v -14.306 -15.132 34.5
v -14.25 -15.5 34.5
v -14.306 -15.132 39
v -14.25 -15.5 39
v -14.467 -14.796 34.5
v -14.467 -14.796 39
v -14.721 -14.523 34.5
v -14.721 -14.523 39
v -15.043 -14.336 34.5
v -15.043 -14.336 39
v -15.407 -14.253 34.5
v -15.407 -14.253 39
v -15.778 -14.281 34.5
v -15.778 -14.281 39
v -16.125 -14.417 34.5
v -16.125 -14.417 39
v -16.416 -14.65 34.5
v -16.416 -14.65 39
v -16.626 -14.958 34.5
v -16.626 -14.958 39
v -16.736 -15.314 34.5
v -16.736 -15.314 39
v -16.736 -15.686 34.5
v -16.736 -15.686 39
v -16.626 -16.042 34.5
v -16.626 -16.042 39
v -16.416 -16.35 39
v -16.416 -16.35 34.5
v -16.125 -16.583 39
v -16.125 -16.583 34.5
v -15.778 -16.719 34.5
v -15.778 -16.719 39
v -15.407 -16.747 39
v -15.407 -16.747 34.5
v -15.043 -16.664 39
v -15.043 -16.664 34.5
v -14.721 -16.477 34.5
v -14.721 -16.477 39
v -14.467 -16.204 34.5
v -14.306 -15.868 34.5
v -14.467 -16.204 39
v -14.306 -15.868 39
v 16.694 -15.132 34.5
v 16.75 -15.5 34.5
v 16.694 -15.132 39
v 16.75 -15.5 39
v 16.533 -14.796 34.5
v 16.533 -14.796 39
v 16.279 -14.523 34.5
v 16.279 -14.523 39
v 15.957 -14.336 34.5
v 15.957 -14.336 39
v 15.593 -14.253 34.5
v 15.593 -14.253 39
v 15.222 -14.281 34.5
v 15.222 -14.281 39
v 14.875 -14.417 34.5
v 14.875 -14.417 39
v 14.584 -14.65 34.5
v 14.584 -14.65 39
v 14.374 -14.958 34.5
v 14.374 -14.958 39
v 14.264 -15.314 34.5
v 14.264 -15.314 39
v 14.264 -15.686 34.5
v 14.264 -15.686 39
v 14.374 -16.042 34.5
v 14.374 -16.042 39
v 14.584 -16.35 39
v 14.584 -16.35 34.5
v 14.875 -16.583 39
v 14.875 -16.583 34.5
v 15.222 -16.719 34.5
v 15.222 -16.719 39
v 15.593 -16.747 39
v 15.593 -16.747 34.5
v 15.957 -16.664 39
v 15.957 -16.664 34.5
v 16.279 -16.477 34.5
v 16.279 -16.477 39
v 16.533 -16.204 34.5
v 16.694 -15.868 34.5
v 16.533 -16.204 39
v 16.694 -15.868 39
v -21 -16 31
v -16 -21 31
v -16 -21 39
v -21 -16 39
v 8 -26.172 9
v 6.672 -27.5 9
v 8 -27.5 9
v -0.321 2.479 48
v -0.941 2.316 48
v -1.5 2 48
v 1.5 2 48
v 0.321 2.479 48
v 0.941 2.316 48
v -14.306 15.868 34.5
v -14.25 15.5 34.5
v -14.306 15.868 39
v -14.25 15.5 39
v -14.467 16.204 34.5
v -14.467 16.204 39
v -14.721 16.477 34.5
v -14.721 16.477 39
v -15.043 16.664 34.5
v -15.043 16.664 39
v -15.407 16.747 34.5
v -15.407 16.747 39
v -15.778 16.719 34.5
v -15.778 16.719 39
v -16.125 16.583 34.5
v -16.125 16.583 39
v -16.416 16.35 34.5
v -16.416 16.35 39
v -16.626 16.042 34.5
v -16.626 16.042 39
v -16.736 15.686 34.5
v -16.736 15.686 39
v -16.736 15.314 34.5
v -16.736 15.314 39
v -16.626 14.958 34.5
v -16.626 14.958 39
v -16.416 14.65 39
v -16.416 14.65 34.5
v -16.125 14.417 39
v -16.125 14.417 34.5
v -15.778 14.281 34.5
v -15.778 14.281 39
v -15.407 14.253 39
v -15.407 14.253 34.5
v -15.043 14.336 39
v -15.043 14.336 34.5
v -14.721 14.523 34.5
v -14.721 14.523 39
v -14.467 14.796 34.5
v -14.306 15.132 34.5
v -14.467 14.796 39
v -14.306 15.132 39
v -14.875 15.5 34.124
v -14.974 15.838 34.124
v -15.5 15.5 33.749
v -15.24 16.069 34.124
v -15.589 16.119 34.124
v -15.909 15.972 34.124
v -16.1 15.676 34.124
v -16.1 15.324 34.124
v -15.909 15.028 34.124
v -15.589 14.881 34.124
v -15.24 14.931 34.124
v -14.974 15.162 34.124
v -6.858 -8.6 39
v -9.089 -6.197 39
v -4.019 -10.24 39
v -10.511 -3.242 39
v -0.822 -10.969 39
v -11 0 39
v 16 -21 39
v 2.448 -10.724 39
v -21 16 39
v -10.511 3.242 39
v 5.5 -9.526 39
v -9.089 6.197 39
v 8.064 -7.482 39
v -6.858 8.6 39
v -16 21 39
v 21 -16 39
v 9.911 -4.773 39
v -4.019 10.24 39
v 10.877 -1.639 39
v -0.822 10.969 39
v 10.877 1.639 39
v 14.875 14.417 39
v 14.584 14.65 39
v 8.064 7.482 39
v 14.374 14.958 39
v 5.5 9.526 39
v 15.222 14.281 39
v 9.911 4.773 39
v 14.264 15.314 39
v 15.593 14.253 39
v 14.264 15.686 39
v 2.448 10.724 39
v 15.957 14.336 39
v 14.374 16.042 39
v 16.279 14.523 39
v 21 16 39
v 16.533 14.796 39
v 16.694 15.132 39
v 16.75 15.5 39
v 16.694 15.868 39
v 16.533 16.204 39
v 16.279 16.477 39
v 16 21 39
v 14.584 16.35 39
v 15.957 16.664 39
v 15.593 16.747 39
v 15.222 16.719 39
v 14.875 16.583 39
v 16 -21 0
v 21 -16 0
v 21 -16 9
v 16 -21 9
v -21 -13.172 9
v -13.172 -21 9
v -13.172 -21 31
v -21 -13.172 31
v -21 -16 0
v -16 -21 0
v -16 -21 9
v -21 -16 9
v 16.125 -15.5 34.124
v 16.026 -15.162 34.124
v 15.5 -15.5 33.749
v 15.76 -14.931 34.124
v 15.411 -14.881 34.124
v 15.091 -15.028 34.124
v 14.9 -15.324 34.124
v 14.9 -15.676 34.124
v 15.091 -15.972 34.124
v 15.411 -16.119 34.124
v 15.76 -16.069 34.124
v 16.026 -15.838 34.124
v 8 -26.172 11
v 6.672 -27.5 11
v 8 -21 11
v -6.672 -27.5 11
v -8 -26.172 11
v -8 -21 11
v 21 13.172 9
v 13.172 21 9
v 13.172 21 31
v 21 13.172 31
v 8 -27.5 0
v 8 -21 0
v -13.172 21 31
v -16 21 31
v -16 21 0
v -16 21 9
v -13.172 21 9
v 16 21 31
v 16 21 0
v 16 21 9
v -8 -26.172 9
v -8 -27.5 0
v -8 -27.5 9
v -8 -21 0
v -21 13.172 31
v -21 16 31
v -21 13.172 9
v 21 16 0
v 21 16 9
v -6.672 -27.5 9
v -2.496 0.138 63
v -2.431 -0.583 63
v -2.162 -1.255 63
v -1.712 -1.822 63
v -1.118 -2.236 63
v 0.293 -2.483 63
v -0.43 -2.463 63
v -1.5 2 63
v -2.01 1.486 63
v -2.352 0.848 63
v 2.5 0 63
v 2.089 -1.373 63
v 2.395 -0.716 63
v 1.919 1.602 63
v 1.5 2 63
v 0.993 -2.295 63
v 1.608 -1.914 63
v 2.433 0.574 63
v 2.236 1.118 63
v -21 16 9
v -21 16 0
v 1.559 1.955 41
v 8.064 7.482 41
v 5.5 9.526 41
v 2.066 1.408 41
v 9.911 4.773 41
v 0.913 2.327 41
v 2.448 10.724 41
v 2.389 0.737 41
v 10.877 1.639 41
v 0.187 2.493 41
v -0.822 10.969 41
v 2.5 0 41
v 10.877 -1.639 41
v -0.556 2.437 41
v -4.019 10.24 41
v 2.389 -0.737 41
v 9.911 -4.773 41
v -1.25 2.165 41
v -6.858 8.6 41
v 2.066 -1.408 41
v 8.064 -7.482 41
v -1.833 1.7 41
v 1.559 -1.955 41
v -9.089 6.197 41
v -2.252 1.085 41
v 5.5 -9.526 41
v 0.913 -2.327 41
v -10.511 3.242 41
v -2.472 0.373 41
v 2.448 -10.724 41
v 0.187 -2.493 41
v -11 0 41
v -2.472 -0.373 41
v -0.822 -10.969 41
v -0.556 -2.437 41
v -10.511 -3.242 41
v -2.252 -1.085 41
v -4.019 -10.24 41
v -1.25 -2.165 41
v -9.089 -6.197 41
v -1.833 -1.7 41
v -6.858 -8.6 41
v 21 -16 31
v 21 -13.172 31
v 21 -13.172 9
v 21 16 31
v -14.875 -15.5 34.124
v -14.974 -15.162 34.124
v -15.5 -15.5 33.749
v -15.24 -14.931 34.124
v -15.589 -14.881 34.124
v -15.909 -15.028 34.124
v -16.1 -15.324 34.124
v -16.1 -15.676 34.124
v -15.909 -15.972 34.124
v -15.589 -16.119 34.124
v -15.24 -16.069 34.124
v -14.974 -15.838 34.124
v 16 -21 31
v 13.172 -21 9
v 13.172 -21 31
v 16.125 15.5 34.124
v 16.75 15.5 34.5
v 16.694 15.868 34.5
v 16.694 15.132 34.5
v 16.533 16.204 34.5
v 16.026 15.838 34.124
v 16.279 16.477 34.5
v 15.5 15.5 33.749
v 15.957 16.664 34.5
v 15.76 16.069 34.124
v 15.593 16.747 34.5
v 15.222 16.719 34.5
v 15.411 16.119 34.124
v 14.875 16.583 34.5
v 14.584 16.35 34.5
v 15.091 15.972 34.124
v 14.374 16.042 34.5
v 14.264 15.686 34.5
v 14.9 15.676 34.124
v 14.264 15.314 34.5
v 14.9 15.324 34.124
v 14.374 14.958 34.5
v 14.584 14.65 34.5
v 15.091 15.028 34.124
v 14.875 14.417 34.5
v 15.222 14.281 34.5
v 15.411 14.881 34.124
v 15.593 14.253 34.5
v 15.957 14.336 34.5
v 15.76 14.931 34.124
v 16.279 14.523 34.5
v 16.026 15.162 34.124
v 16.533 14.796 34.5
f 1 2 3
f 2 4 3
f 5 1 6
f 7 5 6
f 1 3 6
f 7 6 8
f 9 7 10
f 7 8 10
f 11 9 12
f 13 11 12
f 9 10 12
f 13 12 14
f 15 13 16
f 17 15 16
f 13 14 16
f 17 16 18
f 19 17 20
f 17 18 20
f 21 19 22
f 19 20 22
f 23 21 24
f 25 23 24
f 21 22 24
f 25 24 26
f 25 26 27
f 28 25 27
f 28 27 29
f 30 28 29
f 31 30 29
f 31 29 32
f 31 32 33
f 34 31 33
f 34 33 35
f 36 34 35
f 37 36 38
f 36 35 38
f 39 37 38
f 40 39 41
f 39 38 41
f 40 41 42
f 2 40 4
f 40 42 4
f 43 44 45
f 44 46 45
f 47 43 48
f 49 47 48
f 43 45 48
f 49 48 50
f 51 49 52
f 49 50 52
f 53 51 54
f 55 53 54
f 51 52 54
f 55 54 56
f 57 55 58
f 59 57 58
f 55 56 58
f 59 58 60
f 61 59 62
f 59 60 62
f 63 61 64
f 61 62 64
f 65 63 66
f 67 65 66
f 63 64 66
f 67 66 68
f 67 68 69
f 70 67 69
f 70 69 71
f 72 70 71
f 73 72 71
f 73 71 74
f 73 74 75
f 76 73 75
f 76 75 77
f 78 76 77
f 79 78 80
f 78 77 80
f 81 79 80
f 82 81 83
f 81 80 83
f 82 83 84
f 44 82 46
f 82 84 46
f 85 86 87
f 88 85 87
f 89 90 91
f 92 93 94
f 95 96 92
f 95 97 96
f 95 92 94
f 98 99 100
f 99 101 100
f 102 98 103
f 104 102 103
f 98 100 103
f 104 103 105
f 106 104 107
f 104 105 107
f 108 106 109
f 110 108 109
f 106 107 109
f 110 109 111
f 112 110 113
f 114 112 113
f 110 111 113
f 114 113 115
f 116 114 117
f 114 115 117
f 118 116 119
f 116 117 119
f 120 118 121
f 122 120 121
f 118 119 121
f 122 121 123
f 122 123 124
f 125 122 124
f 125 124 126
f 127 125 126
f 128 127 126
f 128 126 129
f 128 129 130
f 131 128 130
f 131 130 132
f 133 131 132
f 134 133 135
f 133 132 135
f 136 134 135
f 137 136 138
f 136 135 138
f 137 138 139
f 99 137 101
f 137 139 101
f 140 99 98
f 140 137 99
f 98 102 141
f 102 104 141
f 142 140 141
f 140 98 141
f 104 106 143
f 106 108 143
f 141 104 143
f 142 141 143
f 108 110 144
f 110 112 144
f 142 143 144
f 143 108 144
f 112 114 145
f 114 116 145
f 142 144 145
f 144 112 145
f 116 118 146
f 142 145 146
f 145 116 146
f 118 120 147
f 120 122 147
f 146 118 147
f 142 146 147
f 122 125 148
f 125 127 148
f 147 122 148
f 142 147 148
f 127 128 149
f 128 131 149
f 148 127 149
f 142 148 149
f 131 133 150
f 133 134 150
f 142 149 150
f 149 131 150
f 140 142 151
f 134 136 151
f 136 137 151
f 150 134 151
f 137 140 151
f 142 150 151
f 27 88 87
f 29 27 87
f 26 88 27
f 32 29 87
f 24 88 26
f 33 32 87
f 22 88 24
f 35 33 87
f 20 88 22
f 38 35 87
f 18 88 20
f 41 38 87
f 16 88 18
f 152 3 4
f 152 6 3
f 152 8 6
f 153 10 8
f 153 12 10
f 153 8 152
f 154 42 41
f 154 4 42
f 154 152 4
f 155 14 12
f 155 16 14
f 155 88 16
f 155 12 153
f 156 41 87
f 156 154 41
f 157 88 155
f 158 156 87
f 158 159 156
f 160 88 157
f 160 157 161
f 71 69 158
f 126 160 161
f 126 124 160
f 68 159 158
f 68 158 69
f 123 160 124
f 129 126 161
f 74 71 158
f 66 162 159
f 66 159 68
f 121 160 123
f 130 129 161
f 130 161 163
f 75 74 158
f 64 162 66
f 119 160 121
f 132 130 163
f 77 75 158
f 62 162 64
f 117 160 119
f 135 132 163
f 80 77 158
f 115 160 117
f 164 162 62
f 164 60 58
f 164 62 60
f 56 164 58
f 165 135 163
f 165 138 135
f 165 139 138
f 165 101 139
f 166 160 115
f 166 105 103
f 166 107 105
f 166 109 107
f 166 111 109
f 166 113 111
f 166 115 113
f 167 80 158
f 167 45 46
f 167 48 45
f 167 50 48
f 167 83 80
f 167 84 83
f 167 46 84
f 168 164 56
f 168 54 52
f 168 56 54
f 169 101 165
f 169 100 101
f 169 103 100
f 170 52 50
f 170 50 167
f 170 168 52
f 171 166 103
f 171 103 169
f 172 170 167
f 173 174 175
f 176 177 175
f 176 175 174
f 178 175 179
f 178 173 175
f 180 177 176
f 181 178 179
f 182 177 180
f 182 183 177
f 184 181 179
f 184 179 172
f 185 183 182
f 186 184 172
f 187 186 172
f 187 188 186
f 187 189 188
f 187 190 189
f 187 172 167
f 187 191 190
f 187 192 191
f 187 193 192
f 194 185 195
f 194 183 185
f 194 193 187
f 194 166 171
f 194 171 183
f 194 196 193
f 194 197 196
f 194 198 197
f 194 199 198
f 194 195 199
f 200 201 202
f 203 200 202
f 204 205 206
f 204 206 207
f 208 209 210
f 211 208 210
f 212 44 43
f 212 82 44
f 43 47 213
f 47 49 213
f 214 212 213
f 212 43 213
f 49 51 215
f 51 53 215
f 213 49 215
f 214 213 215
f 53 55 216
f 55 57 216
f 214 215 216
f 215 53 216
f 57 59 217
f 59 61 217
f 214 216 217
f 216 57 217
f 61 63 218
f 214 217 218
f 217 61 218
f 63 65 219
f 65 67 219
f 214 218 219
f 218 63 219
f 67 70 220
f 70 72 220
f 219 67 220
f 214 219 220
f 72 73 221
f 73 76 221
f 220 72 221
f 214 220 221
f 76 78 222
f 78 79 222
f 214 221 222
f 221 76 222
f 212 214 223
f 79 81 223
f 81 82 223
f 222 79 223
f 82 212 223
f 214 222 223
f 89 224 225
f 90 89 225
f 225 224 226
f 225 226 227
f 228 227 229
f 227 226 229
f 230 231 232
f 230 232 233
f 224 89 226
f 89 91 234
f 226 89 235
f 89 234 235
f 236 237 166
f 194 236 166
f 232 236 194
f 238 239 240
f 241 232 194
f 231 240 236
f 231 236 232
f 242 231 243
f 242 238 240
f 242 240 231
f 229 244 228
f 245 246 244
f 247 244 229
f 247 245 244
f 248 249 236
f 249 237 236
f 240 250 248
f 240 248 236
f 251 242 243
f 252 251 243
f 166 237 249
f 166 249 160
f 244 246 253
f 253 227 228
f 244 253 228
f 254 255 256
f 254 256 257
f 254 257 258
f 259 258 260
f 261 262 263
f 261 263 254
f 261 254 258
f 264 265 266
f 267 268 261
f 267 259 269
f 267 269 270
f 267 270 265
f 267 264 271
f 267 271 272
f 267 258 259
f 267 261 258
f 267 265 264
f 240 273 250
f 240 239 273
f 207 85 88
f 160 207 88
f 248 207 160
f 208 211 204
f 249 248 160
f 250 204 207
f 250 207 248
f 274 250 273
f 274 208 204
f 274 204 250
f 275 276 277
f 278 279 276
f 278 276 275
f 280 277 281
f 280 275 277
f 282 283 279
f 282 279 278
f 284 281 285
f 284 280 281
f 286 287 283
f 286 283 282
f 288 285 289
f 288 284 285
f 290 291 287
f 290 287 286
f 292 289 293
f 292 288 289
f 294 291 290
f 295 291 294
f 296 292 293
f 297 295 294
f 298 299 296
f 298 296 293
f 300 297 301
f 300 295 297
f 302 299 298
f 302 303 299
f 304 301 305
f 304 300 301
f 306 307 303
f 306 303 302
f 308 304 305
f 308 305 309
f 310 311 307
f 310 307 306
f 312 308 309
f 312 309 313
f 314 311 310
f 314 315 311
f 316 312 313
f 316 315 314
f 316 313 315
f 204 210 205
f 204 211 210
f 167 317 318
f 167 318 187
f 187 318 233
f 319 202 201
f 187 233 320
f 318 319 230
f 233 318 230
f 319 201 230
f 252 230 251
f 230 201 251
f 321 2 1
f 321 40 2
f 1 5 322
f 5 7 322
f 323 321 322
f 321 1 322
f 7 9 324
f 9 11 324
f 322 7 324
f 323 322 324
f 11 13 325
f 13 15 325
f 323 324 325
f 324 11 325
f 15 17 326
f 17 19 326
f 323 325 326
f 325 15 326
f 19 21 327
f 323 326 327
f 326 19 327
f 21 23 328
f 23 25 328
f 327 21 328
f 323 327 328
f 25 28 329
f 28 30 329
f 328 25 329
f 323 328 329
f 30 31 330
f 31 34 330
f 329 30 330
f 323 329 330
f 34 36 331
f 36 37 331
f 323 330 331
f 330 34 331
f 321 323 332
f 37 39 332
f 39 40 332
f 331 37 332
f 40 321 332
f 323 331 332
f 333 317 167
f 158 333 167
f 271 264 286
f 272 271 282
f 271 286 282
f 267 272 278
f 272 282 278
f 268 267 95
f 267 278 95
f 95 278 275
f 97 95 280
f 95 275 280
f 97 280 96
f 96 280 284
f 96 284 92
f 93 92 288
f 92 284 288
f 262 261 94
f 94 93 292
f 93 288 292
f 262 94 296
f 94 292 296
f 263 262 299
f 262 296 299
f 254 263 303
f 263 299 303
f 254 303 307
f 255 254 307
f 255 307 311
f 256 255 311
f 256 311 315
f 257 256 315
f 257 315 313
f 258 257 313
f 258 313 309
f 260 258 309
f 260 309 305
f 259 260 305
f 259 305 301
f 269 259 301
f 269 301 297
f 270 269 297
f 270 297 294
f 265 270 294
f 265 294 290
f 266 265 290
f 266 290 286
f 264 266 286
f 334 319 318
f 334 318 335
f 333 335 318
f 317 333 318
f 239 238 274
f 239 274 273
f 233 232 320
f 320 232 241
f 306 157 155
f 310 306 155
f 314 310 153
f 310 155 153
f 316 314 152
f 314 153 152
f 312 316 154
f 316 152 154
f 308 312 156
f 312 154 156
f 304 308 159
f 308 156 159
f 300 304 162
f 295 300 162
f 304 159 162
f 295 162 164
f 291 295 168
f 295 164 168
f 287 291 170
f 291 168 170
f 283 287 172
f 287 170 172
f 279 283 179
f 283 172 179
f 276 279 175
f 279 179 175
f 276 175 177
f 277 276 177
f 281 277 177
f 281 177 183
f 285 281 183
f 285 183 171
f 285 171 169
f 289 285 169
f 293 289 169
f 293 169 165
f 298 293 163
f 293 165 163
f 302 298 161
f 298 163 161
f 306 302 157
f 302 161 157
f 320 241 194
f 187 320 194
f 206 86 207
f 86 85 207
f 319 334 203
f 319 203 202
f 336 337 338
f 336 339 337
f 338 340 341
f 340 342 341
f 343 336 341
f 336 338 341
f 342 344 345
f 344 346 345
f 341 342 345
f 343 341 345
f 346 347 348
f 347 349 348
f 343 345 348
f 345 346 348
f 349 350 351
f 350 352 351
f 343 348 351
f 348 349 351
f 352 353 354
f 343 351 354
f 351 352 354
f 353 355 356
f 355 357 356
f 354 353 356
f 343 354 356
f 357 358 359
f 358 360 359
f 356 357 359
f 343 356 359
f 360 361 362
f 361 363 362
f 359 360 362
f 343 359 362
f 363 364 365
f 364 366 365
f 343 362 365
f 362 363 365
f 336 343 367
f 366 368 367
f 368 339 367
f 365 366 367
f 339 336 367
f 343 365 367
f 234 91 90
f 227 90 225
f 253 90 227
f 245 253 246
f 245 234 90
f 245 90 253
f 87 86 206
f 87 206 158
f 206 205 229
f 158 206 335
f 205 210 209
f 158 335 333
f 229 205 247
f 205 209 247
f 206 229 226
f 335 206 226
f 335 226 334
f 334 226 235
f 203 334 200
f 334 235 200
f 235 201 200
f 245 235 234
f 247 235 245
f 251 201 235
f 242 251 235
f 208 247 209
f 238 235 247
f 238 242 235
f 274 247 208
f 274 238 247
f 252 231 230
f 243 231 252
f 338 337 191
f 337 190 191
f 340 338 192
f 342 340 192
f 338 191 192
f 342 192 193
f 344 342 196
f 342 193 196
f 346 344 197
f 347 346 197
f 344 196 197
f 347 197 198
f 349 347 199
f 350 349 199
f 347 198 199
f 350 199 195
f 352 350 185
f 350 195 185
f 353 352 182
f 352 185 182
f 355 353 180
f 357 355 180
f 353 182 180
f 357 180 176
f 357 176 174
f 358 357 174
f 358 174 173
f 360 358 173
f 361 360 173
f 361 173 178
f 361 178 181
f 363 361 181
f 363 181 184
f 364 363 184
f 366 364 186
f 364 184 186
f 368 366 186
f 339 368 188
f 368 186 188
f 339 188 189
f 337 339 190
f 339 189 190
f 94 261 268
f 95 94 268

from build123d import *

# Parameters (mm, degrees)
SKETCH1_W           = 42
SKETCH1_H           = 42
BOSS_EXTRUDE1_DEPTH = 39
CHAMFER1_SIZE       = 5
SKETCH5_R           = 11
SKETCH5_R_2         = 2.5
BOSS_EXTRUDE2_DEPTH = 2
SKETCH6_R           = 2.5
BOSS_EXTRUDE3_DEPTH = 24
SKETCH7_W           = 5.502287021
SKETCH7_H           = 7.880652758
CUT_EXTRUDE1_DEPTH  = 15
SKETCH8_W           = 16
SKETCH8_H           = 13
BOSS_EXTRUDE4_DEPTH = 11
CUT_EXTRUDE2_START  = -8
SKETCH9_W           = 84.832687132
SKETCH9_H           = 82.051636753
CUT_EXTRUDE2_DEPTH  = 22


# Read off the part's stored shape, not the designer's step: M3x0.5 Tapped Hole1
with BuildPart() as part:
    # Sketch1 → Boss-Extrude1 (new body)
    with BuildSketch(Plane.XY):
        Rectangle(SKETCH1_W, SKETCH1_H)
    extrude(amount=BOSS_EXTRUDE1_DEPTH)

    # Chamfer1
    chamfer1_edges = [part.edges().sort_by_distance(p)[0] for p in [
        (21, -21, 19.5),
        (-21, -21, 19.5),
        (-21, 21, 19.5),
        (21, 21, 19.5),
    ]]
    chamfer(chamfer1_edges, length=CHAMFER1_SIZE)

    # M3x0.5 Tapped Hole1 outline → M3x0.5 Tapped Hole1 (revolve, cut)
    with BuildSketch(Plane(origin=(15.5, 15.5, 0), x_dir=(1, 0, 0), z_dir=(0, -1, 0))):
        Polygon((0, 39), (0, 33.748924226), (1.25, 34.5), (1.25, 39), align=None)
    revolve(axis=Axis((15.5, 15.5, 0), (0, 0, 1)), mode=Mode.SUBTRACT)

    # M3x0.5 Tapped Hole1 2 outline → M3x0.5 Tapped Hole1 2 (revolve, cut)
    with BuildSketch(Plane(origin=(-15.5, -15.5, 0), x_dir=(1, 0, 0), z_dir=(0, -1, 0))):
        Polygon((0, 39), (0, 33.748924226), (1.25, 34.5), (1.25, 39), align=None)
    revolve(axis=Axis((-15.5, -15.5, 0), (0, 0, 1)), mode=Mode.SUBTRACT)

    # M3x0.5 Tapped Hole1 3 outline → M3x0.5 Tapped Hole1 3 (revolve, cut)
    with BuildSketch(Plane(origin=(-15.5, 15.5, 0), x_dir=(1, 0, 0), z_dir=(0, -1, 0))):
        Polygon((0, 39), (0, 33.748924226), (1.25, 34.5), (1.25, 39), align=None)
    revolve(axis=Axis((-15.5, 15.5, 0), (0, 0, 1)), mode=Mode.SUBTRACT)

    # M3x0.5 Tapped Hole1 4 outline → M3x0.5 Tapped Hole1 4 (revolve, cut)
    with BuildSketch(Plane(origin=(15.5, -15.5, 0), x_dir=(1, 0, 0), z_dir=(0, -1, 0))):
        Polygon((0, 39), (0, 33.748924226), (1.25, 34.5), (1.25, 39), align=None)
    revolve(axis=Axis((15.5, -15.5, 0), (0, 0, 1)), mode=Mode.SUBTRACT)

    # Sketch5 → Boss-Extrude2 (add)
    with BuildSketch(Plane.XY.offset(39)):
        with Locations(Location((0, 0, 0), (0, 0, 180))):
            Circle(SKETCH5_R)
        Circle(SKETCH5_R_2, mode=Mode.SUBTRACT)
    extrude(amount=BOSS_EXTRUDE2_DEPTH)

    # Sketch6 → Boss-Extrude3 (add)
    with BuildSketch(Plane.XY.offset(39)):
        Circle(SKETCH6_R)
    extrude(amount=BOSS_EXTRUDE3_DEPTH)

    # Sketch7 → Cut-Extrude1 (cut)
    with BuildSketch(Plane.XY.offset(63)):
        with Locations((1.25114351, 5.940326379)):
            Rectangle(SKETCH7_W, SKETCH7_H)
    extrude(amount=-CUT_EXTRUDE1_DEPTH, mode=Mode.SUBTRACT)

    # Sketch8 → Boss-Extrude4 (add)
    with BuildSketch(Plane(origin=(0, 0, 0), x_dir=(-1, 0, 0), z_dir=(0, 0, -1))):
        with Locations((0, -21)):
            Rectangle(SKETCH8_W, SKETCH8_H)
    extrude(amount=-BOSS_EXTRUDE4_DEPTH)

    # Sketch9 → Cut-Extrude2 (cut)
    with BuildSketch(Plane.XY.offset(39).offset(CUT_EXTRUDE2_START)):
        with Locations((-5.67946535, 2.529712031)):
            Rectangle(SKETCH9_W, SKETCH9_H)
        Polygon((-34.171572875, 0), (0, 34.171572875), (34.171572875, 0), (0, -34.171572875), align=None, mode=Mode.SUBTRACT)
    extrude(amount=-CUT_EXTRUDE2_DEPTH, mode=Mode.SUBTRACT)


solid = part.part
